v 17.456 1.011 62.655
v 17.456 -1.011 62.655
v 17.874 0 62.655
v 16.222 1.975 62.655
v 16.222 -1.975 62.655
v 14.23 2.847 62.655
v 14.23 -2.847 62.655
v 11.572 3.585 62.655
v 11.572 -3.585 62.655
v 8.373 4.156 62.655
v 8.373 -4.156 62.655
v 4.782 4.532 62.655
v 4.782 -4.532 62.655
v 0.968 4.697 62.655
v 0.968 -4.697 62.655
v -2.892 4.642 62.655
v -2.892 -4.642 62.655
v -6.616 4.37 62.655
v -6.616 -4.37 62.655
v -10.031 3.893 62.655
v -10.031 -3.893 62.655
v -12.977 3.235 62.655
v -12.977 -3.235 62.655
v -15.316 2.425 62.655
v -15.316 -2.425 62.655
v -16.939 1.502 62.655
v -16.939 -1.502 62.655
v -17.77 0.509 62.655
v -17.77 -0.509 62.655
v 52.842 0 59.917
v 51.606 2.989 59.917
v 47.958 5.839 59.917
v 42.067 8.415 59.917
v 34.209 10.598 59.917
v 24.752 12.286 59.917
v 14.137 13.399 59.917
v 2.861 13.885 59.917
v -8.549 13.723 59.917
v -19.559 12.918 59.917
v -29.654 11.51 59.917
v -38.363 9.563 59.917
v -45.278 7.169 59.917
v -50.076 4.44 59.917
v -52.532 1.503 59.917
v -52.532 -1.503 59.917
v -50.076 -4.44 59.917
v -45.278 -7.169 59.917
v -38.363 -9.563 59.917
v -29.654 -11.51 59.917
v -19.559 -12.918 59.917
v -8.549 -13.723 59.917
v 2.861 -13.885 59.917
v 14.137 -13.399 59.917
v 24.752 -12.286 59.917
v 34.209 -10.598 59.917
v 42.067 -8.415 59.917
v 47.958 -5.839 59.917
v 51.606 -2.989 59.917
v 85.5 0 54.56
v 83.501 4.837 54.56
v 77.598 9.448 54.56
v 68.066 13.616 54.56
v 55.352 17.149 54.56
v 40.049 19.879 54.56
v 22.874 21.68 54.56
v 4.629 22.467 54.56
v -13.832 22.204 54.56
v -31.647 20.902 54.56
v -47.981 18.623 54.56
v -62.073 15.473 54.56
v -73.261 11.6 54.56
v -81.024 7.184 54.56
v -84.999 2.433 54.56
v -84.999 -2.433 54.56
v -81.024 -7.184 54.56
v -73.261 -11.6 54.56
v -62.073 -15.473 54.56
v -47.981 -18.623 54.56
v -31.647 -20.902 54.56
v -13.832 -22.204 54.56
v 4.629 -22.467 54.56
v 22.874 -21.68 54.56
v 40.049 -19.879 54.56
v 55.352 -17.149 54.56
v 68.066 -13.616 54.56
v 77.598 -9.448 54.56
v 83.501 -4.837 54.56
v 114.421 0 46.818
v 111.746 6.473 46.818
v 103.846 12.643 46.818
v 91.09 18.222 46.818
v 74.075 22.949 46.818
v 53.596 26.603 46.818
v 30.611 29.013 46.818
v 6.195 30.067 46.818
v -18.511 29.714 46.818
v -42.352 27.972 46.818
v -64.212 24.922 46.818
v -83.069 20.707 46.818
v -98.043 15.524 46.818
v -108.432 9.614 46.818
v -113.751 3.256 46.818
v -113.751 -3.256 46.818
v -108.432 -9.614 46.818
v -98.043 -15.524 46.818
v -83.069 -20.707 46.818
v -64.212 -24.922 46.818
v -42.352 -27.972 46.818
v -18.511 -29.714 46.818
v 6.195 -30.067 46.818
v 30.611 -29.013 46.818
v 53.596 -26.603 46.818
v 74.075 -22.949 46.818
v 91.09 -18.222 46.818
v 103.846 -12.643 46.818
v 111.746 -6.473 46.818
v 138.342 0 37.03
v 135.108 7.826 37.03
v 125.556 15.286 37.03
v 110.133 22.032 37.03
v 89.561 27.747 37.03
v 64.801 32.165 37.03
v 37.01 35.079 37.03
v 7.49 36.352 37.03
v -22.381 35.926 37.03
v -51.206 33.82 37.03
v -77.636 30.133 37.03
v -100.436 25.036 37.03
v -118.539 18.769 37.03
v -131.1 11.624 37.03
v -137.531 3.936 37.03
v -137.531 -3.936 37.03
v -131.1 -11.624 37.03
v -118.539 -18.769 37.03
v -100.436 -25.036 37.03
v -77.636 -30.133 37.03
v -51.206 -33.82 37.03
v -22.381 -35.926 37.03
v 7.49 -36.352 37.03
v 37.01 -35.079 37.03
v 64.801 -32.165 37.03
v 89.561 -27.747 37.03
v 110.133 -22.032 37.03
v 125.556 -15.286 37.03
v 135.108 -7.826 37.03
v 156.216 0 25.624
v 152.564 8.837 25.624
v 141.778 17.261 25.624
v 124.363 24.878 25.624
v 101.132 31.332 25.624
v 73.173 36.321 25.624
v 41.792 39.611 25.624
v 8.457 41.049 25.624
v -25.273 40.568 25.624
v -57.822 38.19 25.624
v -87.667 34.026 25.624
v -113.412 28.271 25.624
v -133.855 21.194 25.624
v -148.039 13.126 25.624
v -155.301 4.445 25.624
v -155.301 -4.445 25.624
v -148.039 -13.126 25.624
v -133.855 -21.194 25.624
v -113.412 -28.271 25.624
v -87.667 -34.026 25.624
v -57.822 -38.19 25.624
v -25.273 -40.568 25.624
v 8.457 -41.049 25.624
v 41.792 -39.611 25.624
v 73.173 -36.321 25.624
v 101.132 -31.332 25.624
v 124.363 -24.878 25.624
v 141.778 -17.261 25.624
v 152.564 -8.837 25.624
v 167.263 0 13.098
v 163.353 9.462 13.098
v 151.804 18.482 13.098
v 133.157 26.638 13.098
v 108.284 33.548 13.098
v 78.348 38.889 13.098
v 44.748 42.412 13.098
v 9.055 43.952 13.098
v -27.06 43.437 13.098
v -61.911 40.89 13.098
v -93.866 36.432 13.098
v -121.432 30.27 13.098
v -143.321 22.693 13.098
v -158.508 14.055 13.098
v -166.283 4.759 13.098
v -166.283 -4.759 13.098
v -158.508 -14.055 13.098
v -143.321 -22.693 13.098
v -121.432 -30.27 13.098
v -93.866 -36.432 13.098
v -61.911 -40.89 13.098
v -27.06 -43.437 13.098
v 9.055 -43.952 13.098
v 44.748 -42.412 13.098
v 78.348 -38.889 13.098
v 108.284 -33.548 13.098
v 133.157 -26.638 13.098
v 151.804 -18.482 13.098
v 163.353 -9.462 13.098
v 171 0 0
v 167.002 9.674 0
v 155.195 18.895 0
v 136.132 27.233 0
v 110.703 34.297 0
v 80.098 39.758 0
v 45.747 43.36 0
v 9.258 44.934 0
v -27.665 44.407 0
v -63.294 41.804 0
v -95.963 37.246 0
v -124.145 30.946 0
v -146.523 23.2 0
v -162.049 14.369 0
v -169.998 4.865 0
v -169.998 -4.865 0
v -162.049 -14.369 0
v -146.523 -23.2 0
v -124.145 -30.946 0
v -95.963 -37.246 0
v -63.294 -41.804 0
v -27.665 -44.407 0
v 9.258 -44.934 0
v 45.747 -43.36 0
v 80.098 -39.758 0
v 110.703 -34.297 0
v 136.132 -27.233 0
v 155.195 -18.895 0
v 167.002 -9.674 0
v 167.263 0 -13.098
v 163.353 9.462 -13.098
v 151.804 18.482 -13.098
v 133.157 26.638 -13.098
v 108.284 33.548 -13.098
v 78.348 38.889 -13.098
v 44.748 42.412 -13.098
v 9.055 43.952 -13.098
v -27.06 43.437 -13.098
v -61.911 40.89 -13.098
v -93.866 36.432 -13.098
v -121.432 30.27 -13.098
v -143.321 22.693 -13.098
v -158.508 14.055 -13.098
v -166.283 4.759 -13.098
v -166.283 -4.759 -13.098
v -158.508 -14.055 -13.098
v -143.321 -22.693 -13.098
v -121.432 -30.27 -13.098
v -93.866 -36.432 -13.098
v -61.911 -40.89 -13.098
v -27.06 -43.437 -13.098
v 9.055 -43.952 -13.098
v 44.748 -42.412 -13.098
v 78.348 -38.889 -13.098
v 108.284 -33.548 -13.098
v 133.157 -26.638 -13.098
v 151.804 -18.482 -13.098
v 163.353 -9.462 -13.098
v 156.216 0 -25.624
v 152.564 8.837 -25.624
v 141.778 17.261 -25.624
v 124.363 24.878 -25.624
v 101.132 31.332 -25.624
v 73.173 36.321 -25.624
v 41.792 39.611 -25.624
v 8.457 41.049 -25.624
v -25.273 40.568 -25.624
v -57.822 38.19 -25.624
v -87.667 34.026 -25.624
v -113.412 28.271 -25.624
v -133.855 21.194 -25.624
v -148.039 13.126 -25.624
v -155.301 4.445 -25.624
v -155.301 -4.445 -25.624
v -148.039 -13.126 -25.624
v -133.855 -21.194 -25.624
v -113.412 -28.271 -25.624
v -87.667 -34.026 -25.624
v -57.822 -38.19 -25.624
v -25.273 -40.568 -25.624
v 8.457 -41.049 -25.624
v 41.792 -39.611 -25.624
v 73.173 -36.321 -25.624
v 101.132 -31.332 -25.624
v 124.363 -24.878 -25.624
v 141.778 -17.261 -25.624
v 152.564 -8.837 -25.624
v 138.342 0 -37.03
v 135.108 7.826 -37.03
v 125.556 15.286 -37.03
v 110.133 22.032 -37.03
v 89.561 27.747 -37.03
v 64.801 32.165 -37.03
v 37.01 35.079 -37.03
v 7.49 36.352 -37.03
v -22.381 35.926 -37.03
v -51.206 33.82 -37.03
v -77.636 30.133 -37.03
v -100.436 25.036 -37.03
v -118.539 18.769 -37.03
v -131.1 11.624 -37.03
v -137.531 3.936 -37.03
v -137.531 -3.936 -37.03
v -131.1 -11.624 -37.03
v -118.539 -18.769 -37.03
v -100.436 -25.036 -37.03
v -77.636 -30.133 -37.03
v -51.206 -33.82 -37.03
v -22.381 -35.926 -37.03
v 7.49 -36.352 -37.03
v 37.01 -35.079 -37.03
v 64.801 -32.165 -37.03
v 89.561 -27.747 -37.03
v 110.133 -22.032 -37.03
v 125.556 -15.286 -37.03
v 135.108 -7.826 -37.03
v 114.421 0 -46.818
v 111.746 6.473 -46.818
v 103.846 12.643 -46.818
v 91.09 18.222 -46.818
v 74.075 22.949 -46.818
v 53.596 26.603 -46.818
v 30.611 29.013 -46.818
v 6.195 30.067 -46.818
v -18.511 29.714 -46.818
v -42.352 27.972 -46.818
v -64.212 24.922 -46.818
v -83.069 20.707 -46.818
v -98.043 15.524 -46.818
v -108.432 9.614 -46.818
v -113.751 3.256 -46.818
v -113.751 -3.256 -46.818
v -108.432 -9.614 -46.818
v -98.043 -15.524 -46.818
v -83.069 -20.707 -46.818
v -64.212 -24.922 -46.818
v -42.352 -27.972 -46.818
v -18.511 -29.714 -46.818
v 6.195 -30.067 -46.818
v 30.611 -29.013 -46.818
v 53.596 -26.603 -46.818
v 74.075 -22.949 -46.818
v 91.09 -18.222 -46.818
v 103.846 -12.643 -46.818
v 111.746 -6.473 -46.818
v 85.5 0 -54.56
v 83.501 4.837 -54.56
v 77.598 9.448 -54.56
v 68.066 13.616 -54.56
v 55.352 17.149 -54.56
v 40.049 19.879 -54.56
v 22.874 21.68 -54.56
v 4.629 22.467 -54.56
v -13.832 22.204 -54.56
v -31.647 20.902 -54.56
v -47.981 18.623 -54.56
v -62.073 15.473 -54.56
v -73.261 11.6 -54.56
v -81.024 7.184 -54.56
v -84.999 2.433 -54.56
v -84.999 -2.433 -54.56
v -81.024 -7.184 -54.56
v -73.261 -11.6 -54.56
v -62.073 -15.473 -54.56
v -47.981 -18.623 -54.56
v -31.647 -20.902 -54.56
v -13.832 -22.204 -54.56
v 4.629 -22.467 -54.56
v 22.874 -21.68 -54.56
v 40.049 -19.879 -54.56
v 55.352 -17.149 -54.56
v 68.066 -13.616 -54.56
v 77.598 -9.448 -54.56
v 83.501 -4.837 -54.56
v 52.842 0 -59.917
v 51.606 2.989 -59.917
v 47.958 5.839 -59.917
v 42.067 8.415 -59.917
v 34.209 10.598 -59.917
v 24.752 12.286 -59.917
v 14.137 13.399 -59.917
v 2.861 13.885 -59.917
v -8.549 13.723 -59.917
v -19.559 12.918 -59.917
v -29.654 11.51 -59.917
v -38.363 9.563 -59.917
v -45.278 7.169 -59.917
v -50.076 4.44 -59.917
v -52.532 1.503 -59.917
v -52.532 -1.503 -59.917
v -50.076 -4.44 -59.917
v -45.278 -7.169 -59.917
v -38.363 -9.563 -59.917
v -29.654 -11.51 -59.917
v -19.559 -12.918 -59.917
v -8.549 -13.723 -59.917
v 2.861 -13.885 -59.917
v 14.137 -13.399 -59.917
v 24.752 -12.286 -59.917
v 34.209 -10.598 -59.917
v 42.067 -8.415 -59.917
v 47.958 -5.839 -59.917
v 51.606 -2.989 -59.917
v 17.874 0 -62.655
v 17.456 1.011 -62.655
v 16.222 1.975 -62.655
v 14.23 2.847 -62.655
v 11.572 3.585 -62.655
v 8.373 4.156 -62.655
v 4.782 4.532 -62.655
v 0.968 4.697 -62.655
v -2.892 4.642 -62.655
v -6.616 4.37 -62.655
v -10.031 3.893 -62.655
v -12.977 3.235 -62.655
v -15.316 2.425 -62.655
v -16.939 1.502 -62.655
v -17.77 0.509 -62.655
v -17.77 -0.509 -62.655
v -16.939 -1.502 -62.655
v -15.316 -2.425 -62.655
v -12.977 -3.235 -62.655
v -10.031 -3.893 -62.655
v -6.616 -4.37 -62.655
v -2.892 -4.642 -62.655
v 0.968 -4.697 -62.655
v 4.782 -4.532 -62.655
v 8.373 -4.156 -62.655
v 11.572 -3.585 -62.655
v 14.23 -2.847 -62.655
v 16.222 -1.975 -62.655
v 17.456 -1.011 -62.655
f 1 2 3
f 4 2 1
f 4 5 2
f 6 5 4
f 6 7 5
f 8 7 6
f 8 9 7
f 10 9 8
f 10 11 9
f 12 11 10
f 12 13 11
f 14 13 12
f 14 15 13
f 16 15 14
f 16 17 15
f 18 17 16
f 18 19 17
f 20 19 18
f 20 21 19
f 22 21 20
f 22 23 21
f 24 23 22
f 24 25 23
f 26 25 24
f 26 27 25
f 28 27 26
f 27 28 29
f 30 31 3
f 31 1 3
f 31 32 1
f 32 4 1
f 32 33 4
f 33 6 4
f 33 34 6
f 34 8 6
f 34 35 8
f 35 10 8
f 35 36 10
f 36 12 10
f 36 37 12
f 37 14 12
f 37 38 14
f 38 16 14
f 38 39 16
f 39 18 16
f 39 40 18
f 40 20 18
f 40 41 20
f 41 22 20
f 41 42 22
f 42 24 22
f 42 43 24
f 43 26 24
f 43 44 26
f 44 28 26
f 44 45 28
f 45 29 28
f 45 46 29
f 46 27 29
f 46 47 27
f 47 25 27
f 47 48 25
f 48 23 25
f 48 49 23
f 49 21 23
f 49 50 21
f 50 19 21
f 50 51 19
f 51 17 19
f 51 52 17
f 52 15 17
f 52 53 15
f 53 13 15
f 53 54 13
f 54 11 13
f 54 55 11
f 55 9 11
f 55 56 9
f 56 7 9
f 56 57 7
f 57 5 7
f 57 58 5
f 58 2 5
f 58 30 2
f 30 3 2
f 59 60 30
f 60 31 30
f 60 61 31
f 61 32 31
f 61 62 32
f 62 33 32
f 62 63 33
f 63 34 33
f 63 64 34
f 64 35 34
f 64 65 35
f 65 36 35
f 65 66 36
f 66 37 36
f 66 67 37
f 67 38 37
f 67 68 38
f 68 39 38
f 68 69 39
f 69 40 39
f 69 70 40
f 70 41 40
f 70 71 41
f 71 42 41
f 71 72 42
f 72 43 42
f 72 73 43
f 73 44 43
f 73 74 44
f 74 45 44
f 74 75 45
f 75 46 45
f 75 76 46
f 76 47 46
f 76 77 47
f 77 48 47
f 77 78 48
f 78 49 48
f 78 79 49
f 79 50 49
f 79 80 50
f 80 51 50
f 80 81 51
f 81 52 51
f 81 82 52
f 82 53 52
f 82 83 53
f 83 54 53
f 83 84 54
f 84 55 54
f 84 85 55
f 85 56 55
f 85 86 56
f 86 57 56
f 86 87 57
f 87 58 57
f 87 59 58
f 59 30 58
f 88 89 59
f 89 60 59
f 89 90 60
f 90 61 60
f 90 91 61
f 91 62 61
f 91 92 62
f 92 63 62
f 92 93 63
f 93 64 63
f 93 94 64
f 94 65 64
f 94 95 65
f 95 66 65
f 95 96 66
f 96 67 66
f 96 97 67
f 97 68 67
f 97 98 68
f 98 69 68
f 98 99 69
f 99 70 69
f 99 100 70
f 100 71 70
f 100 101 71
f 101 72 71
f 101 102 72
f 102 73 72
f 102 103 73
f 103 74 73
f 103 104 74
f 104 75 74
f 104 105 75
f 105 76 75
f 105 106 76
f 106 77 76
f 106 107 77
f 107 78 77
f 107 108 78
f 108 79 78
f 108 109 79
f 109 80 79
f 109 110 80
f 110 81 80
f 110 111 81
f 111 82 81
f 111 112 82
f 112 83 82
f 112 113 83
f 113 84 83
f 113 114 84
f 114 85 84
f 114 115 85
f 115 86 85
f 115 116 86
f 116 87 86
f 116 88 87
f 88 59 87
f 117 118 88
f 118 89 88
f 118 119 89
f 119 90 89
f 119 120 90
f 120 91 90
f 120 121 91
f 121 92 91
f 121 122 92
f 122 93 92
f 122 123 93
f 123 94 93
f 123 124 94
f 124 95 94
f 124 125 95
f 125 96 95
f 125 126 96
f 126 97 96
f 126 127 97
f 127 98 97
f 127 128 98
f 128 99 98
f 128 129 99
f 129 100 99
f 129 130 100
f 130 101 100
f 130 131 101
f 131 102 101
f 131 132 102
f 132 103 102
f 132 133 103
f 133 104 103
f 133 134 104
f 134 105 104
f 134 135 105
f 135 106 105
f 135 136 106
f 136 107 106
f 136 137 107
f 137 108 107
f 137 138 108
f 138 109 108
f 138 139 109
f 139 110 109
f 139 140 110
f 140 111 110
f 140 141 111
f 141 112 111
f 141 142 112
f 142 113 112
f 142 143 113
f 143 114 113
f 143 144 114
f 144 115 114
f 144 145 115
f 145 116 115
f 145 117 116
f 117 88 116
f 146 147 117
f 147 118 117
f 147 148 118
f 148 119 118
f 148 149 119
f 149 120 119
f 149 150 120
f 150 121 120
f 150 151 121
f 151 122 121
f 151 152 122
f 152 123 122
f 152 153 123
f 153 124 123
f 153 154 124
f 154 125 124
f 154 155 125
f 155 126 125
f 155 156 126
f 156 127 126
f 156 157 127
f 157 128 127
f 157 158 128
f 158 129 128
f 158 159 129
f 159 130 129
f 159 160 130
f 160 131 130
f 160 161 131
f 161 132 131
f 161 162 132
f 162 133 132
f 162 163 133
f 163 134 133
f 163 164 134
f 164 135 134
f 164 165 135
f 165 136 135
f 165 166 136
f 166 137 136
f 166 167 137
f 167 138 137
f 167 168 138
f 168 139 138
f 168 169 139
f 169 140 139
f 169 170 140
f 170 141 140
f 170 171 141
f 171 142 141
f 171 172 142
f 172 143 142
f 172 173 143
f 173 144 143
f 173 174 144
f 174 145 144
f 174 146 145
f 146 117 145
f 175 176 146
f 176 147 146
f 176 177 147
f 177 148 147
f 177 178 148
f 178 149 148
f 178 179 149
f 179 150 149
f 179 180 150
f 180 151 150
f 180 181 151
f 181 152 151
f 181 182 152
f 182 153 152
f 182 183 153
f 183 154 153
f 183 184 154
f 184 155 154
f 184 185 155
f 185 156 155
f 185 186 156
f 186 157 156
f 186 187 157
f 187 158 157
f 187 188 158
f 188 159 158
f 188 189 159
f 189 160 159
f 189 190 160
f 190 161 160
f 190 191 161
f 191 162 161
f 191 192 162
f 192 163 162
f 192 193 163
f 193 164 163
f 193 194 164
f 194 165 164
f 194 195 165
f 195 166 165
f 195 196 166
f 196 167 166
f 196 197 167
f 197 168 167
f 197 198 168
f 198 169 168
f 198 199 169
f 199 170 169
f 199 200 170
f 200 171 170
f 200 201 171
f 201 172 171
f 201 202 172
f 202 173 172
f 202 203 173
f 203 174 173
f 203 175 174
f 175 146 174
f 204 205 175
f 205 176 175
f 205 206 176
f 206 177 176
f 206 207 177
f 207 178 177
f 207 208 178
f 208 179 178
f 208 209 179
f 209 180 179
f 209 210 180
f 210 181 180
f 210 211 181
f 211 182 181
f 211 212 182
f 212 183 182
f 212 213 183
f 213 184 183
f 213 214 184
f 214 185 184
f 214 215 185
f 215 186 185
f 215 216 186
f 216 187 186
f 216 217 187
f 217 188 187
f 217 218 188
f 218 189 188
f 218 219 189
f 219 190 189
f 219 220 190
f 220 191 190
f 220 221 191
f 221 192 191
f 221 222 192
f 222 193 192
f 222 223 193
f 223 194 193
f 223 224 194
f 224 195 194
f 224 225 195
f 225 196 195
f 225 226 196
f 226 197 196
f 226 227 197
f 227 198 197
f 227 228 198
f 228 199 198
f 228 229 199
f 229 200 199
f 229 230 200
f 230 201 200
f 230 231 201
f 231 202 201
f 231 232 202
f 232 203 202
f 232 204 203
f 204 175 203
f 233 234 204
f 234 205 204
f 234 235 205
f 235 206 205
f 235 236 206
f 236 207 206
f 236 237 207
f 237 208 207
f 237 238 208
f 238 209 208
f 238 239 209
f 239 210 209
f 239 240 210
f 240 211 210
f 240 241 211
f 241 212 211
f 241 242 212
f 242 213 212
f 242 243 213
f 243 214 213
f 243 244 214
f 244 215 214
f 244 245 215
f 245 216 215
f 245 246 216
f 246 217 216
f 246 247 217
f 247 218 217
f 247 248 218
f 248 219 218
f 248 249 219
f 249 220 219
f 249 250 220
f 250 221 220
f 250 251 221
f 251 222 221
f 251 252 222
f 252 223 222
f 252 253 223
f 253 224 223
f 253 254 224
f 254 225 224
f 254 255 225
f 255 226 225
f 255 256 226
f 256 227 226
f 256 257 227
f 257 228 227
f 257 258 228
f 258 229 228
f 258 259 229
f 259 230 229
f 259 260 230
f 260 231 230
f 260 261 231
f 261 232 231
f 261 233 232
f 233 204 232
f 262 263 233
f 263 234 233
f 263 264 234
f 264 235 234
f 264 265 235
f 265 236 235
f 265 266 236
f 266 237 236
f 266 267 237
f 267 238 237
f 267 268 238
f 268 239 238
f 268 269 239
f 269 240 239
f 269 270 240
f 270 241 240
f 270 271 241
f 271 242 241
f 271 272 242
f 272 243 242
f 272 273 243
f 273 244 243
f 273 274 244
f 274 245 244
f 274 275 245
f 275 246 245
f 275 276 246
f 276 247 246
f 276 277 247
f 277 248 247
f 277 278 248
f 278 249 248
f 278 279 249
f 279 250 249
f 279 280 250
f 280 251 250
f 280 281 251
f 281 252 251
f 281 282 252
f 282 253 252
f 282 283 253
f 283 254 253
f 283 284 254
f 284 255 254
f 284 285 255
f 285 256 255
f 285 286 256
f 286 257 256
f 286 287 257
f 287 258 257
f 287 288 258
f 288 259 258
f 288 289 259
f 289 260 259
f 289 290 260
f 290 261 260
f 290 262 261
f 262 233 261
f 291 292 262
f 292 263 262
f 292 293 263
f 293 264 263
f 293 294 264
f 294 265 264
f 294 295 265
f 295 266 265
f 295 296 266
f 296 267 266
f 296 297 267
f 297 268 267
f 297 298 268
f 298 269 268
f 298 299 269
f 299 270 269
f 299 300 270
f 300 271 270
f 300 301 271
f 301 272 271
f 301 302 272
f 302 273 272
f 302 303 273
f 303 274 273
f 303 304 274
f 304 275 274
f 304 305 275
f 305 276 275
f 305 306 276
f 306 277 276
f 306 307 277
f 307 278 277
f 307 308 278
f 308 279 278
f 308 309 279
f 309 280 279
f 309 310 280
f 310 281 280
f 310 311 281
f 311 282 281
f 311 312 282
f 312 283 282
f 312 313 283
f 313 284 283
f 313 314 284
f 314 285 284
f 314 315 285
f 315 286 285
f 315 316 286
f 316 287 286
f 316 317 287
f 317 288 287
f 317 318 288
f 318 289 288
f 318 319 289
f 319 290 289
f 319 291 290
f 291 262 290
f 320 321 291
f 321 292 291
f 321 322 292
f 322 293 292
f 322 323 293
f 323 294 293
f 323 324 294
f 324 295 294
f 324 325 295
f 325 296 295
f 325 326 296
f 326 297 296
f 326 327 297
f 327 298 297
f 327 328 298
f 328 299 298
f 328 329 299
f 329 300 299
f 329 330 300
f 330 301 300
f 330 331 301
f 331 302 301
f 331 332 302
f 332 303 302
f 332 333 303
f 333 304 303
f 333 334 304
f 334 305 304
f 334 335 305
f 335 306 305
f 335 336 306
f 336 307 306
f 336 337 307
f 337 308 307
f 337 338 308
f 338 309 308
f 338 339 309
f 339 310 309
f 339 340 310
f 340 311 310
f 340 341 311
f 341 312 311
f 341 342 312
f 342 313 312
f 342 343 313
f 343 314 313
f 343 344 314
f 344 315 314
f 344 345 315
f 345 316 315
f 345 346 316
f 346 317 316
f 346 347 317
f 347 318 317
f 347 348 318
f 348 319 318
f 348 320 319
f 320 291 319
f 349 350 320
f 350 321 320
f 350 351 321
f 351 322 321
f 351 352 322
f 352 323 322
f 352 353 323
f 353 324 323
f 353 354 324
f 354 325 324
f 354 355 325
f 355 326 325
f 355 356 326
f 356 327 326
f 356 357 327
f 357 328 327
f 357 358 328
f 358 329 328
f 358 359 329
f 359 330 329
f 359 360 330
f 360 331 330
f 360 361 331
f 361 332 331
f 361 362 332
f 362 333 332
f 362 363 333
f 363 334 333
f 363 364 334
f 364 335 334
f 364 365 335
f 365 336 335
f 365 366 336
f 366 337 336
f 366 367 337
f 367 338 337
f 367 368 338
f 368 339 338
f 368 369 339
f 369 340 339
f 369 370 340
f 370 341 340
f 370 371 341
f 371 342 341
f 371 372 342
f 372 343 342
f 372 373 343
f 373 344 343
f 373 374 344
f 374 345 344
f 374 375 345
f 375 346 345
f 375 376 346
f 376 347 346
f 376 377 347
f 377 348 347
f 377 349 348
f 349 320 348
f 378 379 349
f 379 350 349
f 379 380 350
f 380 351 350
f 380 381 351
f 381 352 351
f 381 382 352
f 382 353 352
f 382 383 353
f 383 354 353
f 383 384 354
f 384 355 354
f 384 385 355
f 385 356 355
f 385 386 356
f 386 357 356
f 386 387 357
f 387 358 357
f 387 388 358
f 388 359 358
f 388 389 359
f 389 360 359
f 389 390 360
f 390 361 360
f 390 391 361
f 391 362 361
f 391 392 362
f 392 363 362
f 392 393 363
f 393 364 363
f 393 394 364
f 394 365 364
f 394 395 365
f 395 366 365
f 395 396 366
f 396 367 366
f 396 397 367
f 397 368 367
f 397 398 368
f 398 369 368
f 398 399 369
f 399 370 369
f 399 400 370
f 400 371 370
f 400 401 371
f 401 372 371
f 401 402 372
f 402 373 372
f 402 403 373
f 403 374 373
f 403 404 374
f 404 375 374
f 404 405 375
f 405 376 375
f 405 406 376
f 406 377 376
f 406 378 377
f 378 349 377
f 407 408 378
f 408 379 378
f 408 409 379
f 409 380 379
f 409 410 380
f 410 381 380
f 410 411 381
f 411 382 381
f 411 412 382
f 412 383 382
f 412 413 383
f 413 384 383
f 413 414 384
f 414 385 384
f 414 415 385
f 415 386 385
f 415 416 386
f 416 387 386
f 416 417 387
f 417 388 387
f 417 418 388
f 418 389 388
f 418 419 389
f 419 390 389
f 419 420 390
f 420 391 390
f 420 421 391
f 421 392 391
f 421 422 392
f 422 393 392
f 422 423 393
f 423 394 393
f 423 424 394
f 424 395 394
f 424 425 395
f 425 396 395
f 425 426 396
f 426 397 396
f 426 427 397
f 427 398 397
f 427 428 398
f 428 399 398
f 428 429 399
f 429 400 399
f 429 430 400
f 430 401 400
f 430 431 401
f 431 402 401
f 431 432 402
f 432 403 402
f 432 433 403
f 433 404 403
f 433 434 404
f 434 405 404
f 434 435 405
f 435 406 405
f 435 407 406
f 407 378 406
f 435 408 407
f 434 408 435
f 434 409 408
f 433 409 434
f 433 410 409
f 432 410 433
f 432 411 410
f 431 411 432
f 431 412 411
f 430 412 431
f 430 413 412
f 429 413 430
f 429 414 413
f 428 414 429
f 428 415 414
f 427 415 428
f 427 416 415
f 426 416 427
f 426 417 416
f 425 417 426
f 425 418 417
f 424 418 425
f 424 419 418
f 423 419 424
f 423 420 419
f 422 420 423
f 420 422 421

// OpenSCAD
// Generated by SolidPython 1.0.1 on 2020-07-29 00:46:53


scale(v = [19, 5, 7]) {
	sphere(r = 9);
}
/***********************************************
*********      SolidPython code:      **********
************************************************
 
# import packages: SolidPython
from solid import *
from solid.utils import *
from itertools import chain, combinations, permutations


class Resize:

    def __init__(self, scad_file):
        self.scad_file = scad_file
        #self.scad_file = import_scad(scad_file)
        # cone/cylinder param:
        self.r1 = 0
        self.r2 = 0
        self.h = 0
        # rectangular prism param:
        self.w = 0
        self.l = 0
        # ellipse param:
        self.r = 0

    # import OpenScad code (file name corresponds to shape)


    # classify shape + parameters
    def assign(self, param1, param2, param3):
        if self.scad_file == 'cone.scad':
            self.r1 = param1
            self.r2 = param2
            self.h = param3
        elif self.scad_file == 'cylinder.scad':
            self.r1 = param1
            self.r2 = param2
            self.h = param3
        elif self.scad_file == 'rectangularPrism.scad':
            self.h = param1
            self.l = param2
            self.w = param3
        else:
            self.r = param1
            self.h = param2

    # resize parameters
    def iterate(self):
        x = range(3, 20, 2)
        i = 1
        if self.scad_file == 'cone.scad':
            tempList = list(permutations(x, 2))
            for temp in tempList:
                param1 = temp[0]
                param2 = temp[1]
                filepath = 'produced_scad_files/' + 'cone' + str(param1) + '_' + str(param2) + '_' + '.scad'
                scad_render_to_file(cylinder(h=param1, r1=param2, r2=0), filepath)

        elif self.scad_file == 'cylinder.scad':
            tempList = list(permutations(x, 3))
            for temp in tempList:
                param1 = temp[0]
                param2 = temp[1]
                filepath = 'produced_scad_files/' + 'cylinder' + str(param1) + '_' + str(param2) + '_' + '.scad'
                scad_render_to_file(cylinder(h=param1, r1=param2, r2=param2), filepath)

        elif self.scad_file == 'rectangularPrism.scad':
            tempList = list(permutations(x, 3))
            for temp in tempList:
                param1 = temp[0]
                param2 = temp[1]
                param3 = temp[2]
                filepath = 'produced_scad_files/' + 'rectangularPrism' + str(param1) + '_' + str(param2) + '_' + str(
                    param3) + '.scad'
                scad_render_to_file(cube(size=(param1, param2, param3)), filepath)

        elif self.scad_file == 'ellipse.scad':
            tempList = list(permutations(x, 4))
            for temp in tempList:
                param1 = temp[0]
                param2 = temp[1]
                param3 = temp[2]
                param4 = temp[3]
                filepath = 'produced_scad_files/' + 'ellipse' + str(param1) + '_' + str(param2) + '_' + str(param3) + '_' + str(param4) + '.scad'
                scad_render_to_file(scale([param1, param2, param3])(sphere(r=param4)), filepath)

    def render_to_scadfile(self):
        scad_render_to_file(scad, 'example.scad') 
 
************************************************/
